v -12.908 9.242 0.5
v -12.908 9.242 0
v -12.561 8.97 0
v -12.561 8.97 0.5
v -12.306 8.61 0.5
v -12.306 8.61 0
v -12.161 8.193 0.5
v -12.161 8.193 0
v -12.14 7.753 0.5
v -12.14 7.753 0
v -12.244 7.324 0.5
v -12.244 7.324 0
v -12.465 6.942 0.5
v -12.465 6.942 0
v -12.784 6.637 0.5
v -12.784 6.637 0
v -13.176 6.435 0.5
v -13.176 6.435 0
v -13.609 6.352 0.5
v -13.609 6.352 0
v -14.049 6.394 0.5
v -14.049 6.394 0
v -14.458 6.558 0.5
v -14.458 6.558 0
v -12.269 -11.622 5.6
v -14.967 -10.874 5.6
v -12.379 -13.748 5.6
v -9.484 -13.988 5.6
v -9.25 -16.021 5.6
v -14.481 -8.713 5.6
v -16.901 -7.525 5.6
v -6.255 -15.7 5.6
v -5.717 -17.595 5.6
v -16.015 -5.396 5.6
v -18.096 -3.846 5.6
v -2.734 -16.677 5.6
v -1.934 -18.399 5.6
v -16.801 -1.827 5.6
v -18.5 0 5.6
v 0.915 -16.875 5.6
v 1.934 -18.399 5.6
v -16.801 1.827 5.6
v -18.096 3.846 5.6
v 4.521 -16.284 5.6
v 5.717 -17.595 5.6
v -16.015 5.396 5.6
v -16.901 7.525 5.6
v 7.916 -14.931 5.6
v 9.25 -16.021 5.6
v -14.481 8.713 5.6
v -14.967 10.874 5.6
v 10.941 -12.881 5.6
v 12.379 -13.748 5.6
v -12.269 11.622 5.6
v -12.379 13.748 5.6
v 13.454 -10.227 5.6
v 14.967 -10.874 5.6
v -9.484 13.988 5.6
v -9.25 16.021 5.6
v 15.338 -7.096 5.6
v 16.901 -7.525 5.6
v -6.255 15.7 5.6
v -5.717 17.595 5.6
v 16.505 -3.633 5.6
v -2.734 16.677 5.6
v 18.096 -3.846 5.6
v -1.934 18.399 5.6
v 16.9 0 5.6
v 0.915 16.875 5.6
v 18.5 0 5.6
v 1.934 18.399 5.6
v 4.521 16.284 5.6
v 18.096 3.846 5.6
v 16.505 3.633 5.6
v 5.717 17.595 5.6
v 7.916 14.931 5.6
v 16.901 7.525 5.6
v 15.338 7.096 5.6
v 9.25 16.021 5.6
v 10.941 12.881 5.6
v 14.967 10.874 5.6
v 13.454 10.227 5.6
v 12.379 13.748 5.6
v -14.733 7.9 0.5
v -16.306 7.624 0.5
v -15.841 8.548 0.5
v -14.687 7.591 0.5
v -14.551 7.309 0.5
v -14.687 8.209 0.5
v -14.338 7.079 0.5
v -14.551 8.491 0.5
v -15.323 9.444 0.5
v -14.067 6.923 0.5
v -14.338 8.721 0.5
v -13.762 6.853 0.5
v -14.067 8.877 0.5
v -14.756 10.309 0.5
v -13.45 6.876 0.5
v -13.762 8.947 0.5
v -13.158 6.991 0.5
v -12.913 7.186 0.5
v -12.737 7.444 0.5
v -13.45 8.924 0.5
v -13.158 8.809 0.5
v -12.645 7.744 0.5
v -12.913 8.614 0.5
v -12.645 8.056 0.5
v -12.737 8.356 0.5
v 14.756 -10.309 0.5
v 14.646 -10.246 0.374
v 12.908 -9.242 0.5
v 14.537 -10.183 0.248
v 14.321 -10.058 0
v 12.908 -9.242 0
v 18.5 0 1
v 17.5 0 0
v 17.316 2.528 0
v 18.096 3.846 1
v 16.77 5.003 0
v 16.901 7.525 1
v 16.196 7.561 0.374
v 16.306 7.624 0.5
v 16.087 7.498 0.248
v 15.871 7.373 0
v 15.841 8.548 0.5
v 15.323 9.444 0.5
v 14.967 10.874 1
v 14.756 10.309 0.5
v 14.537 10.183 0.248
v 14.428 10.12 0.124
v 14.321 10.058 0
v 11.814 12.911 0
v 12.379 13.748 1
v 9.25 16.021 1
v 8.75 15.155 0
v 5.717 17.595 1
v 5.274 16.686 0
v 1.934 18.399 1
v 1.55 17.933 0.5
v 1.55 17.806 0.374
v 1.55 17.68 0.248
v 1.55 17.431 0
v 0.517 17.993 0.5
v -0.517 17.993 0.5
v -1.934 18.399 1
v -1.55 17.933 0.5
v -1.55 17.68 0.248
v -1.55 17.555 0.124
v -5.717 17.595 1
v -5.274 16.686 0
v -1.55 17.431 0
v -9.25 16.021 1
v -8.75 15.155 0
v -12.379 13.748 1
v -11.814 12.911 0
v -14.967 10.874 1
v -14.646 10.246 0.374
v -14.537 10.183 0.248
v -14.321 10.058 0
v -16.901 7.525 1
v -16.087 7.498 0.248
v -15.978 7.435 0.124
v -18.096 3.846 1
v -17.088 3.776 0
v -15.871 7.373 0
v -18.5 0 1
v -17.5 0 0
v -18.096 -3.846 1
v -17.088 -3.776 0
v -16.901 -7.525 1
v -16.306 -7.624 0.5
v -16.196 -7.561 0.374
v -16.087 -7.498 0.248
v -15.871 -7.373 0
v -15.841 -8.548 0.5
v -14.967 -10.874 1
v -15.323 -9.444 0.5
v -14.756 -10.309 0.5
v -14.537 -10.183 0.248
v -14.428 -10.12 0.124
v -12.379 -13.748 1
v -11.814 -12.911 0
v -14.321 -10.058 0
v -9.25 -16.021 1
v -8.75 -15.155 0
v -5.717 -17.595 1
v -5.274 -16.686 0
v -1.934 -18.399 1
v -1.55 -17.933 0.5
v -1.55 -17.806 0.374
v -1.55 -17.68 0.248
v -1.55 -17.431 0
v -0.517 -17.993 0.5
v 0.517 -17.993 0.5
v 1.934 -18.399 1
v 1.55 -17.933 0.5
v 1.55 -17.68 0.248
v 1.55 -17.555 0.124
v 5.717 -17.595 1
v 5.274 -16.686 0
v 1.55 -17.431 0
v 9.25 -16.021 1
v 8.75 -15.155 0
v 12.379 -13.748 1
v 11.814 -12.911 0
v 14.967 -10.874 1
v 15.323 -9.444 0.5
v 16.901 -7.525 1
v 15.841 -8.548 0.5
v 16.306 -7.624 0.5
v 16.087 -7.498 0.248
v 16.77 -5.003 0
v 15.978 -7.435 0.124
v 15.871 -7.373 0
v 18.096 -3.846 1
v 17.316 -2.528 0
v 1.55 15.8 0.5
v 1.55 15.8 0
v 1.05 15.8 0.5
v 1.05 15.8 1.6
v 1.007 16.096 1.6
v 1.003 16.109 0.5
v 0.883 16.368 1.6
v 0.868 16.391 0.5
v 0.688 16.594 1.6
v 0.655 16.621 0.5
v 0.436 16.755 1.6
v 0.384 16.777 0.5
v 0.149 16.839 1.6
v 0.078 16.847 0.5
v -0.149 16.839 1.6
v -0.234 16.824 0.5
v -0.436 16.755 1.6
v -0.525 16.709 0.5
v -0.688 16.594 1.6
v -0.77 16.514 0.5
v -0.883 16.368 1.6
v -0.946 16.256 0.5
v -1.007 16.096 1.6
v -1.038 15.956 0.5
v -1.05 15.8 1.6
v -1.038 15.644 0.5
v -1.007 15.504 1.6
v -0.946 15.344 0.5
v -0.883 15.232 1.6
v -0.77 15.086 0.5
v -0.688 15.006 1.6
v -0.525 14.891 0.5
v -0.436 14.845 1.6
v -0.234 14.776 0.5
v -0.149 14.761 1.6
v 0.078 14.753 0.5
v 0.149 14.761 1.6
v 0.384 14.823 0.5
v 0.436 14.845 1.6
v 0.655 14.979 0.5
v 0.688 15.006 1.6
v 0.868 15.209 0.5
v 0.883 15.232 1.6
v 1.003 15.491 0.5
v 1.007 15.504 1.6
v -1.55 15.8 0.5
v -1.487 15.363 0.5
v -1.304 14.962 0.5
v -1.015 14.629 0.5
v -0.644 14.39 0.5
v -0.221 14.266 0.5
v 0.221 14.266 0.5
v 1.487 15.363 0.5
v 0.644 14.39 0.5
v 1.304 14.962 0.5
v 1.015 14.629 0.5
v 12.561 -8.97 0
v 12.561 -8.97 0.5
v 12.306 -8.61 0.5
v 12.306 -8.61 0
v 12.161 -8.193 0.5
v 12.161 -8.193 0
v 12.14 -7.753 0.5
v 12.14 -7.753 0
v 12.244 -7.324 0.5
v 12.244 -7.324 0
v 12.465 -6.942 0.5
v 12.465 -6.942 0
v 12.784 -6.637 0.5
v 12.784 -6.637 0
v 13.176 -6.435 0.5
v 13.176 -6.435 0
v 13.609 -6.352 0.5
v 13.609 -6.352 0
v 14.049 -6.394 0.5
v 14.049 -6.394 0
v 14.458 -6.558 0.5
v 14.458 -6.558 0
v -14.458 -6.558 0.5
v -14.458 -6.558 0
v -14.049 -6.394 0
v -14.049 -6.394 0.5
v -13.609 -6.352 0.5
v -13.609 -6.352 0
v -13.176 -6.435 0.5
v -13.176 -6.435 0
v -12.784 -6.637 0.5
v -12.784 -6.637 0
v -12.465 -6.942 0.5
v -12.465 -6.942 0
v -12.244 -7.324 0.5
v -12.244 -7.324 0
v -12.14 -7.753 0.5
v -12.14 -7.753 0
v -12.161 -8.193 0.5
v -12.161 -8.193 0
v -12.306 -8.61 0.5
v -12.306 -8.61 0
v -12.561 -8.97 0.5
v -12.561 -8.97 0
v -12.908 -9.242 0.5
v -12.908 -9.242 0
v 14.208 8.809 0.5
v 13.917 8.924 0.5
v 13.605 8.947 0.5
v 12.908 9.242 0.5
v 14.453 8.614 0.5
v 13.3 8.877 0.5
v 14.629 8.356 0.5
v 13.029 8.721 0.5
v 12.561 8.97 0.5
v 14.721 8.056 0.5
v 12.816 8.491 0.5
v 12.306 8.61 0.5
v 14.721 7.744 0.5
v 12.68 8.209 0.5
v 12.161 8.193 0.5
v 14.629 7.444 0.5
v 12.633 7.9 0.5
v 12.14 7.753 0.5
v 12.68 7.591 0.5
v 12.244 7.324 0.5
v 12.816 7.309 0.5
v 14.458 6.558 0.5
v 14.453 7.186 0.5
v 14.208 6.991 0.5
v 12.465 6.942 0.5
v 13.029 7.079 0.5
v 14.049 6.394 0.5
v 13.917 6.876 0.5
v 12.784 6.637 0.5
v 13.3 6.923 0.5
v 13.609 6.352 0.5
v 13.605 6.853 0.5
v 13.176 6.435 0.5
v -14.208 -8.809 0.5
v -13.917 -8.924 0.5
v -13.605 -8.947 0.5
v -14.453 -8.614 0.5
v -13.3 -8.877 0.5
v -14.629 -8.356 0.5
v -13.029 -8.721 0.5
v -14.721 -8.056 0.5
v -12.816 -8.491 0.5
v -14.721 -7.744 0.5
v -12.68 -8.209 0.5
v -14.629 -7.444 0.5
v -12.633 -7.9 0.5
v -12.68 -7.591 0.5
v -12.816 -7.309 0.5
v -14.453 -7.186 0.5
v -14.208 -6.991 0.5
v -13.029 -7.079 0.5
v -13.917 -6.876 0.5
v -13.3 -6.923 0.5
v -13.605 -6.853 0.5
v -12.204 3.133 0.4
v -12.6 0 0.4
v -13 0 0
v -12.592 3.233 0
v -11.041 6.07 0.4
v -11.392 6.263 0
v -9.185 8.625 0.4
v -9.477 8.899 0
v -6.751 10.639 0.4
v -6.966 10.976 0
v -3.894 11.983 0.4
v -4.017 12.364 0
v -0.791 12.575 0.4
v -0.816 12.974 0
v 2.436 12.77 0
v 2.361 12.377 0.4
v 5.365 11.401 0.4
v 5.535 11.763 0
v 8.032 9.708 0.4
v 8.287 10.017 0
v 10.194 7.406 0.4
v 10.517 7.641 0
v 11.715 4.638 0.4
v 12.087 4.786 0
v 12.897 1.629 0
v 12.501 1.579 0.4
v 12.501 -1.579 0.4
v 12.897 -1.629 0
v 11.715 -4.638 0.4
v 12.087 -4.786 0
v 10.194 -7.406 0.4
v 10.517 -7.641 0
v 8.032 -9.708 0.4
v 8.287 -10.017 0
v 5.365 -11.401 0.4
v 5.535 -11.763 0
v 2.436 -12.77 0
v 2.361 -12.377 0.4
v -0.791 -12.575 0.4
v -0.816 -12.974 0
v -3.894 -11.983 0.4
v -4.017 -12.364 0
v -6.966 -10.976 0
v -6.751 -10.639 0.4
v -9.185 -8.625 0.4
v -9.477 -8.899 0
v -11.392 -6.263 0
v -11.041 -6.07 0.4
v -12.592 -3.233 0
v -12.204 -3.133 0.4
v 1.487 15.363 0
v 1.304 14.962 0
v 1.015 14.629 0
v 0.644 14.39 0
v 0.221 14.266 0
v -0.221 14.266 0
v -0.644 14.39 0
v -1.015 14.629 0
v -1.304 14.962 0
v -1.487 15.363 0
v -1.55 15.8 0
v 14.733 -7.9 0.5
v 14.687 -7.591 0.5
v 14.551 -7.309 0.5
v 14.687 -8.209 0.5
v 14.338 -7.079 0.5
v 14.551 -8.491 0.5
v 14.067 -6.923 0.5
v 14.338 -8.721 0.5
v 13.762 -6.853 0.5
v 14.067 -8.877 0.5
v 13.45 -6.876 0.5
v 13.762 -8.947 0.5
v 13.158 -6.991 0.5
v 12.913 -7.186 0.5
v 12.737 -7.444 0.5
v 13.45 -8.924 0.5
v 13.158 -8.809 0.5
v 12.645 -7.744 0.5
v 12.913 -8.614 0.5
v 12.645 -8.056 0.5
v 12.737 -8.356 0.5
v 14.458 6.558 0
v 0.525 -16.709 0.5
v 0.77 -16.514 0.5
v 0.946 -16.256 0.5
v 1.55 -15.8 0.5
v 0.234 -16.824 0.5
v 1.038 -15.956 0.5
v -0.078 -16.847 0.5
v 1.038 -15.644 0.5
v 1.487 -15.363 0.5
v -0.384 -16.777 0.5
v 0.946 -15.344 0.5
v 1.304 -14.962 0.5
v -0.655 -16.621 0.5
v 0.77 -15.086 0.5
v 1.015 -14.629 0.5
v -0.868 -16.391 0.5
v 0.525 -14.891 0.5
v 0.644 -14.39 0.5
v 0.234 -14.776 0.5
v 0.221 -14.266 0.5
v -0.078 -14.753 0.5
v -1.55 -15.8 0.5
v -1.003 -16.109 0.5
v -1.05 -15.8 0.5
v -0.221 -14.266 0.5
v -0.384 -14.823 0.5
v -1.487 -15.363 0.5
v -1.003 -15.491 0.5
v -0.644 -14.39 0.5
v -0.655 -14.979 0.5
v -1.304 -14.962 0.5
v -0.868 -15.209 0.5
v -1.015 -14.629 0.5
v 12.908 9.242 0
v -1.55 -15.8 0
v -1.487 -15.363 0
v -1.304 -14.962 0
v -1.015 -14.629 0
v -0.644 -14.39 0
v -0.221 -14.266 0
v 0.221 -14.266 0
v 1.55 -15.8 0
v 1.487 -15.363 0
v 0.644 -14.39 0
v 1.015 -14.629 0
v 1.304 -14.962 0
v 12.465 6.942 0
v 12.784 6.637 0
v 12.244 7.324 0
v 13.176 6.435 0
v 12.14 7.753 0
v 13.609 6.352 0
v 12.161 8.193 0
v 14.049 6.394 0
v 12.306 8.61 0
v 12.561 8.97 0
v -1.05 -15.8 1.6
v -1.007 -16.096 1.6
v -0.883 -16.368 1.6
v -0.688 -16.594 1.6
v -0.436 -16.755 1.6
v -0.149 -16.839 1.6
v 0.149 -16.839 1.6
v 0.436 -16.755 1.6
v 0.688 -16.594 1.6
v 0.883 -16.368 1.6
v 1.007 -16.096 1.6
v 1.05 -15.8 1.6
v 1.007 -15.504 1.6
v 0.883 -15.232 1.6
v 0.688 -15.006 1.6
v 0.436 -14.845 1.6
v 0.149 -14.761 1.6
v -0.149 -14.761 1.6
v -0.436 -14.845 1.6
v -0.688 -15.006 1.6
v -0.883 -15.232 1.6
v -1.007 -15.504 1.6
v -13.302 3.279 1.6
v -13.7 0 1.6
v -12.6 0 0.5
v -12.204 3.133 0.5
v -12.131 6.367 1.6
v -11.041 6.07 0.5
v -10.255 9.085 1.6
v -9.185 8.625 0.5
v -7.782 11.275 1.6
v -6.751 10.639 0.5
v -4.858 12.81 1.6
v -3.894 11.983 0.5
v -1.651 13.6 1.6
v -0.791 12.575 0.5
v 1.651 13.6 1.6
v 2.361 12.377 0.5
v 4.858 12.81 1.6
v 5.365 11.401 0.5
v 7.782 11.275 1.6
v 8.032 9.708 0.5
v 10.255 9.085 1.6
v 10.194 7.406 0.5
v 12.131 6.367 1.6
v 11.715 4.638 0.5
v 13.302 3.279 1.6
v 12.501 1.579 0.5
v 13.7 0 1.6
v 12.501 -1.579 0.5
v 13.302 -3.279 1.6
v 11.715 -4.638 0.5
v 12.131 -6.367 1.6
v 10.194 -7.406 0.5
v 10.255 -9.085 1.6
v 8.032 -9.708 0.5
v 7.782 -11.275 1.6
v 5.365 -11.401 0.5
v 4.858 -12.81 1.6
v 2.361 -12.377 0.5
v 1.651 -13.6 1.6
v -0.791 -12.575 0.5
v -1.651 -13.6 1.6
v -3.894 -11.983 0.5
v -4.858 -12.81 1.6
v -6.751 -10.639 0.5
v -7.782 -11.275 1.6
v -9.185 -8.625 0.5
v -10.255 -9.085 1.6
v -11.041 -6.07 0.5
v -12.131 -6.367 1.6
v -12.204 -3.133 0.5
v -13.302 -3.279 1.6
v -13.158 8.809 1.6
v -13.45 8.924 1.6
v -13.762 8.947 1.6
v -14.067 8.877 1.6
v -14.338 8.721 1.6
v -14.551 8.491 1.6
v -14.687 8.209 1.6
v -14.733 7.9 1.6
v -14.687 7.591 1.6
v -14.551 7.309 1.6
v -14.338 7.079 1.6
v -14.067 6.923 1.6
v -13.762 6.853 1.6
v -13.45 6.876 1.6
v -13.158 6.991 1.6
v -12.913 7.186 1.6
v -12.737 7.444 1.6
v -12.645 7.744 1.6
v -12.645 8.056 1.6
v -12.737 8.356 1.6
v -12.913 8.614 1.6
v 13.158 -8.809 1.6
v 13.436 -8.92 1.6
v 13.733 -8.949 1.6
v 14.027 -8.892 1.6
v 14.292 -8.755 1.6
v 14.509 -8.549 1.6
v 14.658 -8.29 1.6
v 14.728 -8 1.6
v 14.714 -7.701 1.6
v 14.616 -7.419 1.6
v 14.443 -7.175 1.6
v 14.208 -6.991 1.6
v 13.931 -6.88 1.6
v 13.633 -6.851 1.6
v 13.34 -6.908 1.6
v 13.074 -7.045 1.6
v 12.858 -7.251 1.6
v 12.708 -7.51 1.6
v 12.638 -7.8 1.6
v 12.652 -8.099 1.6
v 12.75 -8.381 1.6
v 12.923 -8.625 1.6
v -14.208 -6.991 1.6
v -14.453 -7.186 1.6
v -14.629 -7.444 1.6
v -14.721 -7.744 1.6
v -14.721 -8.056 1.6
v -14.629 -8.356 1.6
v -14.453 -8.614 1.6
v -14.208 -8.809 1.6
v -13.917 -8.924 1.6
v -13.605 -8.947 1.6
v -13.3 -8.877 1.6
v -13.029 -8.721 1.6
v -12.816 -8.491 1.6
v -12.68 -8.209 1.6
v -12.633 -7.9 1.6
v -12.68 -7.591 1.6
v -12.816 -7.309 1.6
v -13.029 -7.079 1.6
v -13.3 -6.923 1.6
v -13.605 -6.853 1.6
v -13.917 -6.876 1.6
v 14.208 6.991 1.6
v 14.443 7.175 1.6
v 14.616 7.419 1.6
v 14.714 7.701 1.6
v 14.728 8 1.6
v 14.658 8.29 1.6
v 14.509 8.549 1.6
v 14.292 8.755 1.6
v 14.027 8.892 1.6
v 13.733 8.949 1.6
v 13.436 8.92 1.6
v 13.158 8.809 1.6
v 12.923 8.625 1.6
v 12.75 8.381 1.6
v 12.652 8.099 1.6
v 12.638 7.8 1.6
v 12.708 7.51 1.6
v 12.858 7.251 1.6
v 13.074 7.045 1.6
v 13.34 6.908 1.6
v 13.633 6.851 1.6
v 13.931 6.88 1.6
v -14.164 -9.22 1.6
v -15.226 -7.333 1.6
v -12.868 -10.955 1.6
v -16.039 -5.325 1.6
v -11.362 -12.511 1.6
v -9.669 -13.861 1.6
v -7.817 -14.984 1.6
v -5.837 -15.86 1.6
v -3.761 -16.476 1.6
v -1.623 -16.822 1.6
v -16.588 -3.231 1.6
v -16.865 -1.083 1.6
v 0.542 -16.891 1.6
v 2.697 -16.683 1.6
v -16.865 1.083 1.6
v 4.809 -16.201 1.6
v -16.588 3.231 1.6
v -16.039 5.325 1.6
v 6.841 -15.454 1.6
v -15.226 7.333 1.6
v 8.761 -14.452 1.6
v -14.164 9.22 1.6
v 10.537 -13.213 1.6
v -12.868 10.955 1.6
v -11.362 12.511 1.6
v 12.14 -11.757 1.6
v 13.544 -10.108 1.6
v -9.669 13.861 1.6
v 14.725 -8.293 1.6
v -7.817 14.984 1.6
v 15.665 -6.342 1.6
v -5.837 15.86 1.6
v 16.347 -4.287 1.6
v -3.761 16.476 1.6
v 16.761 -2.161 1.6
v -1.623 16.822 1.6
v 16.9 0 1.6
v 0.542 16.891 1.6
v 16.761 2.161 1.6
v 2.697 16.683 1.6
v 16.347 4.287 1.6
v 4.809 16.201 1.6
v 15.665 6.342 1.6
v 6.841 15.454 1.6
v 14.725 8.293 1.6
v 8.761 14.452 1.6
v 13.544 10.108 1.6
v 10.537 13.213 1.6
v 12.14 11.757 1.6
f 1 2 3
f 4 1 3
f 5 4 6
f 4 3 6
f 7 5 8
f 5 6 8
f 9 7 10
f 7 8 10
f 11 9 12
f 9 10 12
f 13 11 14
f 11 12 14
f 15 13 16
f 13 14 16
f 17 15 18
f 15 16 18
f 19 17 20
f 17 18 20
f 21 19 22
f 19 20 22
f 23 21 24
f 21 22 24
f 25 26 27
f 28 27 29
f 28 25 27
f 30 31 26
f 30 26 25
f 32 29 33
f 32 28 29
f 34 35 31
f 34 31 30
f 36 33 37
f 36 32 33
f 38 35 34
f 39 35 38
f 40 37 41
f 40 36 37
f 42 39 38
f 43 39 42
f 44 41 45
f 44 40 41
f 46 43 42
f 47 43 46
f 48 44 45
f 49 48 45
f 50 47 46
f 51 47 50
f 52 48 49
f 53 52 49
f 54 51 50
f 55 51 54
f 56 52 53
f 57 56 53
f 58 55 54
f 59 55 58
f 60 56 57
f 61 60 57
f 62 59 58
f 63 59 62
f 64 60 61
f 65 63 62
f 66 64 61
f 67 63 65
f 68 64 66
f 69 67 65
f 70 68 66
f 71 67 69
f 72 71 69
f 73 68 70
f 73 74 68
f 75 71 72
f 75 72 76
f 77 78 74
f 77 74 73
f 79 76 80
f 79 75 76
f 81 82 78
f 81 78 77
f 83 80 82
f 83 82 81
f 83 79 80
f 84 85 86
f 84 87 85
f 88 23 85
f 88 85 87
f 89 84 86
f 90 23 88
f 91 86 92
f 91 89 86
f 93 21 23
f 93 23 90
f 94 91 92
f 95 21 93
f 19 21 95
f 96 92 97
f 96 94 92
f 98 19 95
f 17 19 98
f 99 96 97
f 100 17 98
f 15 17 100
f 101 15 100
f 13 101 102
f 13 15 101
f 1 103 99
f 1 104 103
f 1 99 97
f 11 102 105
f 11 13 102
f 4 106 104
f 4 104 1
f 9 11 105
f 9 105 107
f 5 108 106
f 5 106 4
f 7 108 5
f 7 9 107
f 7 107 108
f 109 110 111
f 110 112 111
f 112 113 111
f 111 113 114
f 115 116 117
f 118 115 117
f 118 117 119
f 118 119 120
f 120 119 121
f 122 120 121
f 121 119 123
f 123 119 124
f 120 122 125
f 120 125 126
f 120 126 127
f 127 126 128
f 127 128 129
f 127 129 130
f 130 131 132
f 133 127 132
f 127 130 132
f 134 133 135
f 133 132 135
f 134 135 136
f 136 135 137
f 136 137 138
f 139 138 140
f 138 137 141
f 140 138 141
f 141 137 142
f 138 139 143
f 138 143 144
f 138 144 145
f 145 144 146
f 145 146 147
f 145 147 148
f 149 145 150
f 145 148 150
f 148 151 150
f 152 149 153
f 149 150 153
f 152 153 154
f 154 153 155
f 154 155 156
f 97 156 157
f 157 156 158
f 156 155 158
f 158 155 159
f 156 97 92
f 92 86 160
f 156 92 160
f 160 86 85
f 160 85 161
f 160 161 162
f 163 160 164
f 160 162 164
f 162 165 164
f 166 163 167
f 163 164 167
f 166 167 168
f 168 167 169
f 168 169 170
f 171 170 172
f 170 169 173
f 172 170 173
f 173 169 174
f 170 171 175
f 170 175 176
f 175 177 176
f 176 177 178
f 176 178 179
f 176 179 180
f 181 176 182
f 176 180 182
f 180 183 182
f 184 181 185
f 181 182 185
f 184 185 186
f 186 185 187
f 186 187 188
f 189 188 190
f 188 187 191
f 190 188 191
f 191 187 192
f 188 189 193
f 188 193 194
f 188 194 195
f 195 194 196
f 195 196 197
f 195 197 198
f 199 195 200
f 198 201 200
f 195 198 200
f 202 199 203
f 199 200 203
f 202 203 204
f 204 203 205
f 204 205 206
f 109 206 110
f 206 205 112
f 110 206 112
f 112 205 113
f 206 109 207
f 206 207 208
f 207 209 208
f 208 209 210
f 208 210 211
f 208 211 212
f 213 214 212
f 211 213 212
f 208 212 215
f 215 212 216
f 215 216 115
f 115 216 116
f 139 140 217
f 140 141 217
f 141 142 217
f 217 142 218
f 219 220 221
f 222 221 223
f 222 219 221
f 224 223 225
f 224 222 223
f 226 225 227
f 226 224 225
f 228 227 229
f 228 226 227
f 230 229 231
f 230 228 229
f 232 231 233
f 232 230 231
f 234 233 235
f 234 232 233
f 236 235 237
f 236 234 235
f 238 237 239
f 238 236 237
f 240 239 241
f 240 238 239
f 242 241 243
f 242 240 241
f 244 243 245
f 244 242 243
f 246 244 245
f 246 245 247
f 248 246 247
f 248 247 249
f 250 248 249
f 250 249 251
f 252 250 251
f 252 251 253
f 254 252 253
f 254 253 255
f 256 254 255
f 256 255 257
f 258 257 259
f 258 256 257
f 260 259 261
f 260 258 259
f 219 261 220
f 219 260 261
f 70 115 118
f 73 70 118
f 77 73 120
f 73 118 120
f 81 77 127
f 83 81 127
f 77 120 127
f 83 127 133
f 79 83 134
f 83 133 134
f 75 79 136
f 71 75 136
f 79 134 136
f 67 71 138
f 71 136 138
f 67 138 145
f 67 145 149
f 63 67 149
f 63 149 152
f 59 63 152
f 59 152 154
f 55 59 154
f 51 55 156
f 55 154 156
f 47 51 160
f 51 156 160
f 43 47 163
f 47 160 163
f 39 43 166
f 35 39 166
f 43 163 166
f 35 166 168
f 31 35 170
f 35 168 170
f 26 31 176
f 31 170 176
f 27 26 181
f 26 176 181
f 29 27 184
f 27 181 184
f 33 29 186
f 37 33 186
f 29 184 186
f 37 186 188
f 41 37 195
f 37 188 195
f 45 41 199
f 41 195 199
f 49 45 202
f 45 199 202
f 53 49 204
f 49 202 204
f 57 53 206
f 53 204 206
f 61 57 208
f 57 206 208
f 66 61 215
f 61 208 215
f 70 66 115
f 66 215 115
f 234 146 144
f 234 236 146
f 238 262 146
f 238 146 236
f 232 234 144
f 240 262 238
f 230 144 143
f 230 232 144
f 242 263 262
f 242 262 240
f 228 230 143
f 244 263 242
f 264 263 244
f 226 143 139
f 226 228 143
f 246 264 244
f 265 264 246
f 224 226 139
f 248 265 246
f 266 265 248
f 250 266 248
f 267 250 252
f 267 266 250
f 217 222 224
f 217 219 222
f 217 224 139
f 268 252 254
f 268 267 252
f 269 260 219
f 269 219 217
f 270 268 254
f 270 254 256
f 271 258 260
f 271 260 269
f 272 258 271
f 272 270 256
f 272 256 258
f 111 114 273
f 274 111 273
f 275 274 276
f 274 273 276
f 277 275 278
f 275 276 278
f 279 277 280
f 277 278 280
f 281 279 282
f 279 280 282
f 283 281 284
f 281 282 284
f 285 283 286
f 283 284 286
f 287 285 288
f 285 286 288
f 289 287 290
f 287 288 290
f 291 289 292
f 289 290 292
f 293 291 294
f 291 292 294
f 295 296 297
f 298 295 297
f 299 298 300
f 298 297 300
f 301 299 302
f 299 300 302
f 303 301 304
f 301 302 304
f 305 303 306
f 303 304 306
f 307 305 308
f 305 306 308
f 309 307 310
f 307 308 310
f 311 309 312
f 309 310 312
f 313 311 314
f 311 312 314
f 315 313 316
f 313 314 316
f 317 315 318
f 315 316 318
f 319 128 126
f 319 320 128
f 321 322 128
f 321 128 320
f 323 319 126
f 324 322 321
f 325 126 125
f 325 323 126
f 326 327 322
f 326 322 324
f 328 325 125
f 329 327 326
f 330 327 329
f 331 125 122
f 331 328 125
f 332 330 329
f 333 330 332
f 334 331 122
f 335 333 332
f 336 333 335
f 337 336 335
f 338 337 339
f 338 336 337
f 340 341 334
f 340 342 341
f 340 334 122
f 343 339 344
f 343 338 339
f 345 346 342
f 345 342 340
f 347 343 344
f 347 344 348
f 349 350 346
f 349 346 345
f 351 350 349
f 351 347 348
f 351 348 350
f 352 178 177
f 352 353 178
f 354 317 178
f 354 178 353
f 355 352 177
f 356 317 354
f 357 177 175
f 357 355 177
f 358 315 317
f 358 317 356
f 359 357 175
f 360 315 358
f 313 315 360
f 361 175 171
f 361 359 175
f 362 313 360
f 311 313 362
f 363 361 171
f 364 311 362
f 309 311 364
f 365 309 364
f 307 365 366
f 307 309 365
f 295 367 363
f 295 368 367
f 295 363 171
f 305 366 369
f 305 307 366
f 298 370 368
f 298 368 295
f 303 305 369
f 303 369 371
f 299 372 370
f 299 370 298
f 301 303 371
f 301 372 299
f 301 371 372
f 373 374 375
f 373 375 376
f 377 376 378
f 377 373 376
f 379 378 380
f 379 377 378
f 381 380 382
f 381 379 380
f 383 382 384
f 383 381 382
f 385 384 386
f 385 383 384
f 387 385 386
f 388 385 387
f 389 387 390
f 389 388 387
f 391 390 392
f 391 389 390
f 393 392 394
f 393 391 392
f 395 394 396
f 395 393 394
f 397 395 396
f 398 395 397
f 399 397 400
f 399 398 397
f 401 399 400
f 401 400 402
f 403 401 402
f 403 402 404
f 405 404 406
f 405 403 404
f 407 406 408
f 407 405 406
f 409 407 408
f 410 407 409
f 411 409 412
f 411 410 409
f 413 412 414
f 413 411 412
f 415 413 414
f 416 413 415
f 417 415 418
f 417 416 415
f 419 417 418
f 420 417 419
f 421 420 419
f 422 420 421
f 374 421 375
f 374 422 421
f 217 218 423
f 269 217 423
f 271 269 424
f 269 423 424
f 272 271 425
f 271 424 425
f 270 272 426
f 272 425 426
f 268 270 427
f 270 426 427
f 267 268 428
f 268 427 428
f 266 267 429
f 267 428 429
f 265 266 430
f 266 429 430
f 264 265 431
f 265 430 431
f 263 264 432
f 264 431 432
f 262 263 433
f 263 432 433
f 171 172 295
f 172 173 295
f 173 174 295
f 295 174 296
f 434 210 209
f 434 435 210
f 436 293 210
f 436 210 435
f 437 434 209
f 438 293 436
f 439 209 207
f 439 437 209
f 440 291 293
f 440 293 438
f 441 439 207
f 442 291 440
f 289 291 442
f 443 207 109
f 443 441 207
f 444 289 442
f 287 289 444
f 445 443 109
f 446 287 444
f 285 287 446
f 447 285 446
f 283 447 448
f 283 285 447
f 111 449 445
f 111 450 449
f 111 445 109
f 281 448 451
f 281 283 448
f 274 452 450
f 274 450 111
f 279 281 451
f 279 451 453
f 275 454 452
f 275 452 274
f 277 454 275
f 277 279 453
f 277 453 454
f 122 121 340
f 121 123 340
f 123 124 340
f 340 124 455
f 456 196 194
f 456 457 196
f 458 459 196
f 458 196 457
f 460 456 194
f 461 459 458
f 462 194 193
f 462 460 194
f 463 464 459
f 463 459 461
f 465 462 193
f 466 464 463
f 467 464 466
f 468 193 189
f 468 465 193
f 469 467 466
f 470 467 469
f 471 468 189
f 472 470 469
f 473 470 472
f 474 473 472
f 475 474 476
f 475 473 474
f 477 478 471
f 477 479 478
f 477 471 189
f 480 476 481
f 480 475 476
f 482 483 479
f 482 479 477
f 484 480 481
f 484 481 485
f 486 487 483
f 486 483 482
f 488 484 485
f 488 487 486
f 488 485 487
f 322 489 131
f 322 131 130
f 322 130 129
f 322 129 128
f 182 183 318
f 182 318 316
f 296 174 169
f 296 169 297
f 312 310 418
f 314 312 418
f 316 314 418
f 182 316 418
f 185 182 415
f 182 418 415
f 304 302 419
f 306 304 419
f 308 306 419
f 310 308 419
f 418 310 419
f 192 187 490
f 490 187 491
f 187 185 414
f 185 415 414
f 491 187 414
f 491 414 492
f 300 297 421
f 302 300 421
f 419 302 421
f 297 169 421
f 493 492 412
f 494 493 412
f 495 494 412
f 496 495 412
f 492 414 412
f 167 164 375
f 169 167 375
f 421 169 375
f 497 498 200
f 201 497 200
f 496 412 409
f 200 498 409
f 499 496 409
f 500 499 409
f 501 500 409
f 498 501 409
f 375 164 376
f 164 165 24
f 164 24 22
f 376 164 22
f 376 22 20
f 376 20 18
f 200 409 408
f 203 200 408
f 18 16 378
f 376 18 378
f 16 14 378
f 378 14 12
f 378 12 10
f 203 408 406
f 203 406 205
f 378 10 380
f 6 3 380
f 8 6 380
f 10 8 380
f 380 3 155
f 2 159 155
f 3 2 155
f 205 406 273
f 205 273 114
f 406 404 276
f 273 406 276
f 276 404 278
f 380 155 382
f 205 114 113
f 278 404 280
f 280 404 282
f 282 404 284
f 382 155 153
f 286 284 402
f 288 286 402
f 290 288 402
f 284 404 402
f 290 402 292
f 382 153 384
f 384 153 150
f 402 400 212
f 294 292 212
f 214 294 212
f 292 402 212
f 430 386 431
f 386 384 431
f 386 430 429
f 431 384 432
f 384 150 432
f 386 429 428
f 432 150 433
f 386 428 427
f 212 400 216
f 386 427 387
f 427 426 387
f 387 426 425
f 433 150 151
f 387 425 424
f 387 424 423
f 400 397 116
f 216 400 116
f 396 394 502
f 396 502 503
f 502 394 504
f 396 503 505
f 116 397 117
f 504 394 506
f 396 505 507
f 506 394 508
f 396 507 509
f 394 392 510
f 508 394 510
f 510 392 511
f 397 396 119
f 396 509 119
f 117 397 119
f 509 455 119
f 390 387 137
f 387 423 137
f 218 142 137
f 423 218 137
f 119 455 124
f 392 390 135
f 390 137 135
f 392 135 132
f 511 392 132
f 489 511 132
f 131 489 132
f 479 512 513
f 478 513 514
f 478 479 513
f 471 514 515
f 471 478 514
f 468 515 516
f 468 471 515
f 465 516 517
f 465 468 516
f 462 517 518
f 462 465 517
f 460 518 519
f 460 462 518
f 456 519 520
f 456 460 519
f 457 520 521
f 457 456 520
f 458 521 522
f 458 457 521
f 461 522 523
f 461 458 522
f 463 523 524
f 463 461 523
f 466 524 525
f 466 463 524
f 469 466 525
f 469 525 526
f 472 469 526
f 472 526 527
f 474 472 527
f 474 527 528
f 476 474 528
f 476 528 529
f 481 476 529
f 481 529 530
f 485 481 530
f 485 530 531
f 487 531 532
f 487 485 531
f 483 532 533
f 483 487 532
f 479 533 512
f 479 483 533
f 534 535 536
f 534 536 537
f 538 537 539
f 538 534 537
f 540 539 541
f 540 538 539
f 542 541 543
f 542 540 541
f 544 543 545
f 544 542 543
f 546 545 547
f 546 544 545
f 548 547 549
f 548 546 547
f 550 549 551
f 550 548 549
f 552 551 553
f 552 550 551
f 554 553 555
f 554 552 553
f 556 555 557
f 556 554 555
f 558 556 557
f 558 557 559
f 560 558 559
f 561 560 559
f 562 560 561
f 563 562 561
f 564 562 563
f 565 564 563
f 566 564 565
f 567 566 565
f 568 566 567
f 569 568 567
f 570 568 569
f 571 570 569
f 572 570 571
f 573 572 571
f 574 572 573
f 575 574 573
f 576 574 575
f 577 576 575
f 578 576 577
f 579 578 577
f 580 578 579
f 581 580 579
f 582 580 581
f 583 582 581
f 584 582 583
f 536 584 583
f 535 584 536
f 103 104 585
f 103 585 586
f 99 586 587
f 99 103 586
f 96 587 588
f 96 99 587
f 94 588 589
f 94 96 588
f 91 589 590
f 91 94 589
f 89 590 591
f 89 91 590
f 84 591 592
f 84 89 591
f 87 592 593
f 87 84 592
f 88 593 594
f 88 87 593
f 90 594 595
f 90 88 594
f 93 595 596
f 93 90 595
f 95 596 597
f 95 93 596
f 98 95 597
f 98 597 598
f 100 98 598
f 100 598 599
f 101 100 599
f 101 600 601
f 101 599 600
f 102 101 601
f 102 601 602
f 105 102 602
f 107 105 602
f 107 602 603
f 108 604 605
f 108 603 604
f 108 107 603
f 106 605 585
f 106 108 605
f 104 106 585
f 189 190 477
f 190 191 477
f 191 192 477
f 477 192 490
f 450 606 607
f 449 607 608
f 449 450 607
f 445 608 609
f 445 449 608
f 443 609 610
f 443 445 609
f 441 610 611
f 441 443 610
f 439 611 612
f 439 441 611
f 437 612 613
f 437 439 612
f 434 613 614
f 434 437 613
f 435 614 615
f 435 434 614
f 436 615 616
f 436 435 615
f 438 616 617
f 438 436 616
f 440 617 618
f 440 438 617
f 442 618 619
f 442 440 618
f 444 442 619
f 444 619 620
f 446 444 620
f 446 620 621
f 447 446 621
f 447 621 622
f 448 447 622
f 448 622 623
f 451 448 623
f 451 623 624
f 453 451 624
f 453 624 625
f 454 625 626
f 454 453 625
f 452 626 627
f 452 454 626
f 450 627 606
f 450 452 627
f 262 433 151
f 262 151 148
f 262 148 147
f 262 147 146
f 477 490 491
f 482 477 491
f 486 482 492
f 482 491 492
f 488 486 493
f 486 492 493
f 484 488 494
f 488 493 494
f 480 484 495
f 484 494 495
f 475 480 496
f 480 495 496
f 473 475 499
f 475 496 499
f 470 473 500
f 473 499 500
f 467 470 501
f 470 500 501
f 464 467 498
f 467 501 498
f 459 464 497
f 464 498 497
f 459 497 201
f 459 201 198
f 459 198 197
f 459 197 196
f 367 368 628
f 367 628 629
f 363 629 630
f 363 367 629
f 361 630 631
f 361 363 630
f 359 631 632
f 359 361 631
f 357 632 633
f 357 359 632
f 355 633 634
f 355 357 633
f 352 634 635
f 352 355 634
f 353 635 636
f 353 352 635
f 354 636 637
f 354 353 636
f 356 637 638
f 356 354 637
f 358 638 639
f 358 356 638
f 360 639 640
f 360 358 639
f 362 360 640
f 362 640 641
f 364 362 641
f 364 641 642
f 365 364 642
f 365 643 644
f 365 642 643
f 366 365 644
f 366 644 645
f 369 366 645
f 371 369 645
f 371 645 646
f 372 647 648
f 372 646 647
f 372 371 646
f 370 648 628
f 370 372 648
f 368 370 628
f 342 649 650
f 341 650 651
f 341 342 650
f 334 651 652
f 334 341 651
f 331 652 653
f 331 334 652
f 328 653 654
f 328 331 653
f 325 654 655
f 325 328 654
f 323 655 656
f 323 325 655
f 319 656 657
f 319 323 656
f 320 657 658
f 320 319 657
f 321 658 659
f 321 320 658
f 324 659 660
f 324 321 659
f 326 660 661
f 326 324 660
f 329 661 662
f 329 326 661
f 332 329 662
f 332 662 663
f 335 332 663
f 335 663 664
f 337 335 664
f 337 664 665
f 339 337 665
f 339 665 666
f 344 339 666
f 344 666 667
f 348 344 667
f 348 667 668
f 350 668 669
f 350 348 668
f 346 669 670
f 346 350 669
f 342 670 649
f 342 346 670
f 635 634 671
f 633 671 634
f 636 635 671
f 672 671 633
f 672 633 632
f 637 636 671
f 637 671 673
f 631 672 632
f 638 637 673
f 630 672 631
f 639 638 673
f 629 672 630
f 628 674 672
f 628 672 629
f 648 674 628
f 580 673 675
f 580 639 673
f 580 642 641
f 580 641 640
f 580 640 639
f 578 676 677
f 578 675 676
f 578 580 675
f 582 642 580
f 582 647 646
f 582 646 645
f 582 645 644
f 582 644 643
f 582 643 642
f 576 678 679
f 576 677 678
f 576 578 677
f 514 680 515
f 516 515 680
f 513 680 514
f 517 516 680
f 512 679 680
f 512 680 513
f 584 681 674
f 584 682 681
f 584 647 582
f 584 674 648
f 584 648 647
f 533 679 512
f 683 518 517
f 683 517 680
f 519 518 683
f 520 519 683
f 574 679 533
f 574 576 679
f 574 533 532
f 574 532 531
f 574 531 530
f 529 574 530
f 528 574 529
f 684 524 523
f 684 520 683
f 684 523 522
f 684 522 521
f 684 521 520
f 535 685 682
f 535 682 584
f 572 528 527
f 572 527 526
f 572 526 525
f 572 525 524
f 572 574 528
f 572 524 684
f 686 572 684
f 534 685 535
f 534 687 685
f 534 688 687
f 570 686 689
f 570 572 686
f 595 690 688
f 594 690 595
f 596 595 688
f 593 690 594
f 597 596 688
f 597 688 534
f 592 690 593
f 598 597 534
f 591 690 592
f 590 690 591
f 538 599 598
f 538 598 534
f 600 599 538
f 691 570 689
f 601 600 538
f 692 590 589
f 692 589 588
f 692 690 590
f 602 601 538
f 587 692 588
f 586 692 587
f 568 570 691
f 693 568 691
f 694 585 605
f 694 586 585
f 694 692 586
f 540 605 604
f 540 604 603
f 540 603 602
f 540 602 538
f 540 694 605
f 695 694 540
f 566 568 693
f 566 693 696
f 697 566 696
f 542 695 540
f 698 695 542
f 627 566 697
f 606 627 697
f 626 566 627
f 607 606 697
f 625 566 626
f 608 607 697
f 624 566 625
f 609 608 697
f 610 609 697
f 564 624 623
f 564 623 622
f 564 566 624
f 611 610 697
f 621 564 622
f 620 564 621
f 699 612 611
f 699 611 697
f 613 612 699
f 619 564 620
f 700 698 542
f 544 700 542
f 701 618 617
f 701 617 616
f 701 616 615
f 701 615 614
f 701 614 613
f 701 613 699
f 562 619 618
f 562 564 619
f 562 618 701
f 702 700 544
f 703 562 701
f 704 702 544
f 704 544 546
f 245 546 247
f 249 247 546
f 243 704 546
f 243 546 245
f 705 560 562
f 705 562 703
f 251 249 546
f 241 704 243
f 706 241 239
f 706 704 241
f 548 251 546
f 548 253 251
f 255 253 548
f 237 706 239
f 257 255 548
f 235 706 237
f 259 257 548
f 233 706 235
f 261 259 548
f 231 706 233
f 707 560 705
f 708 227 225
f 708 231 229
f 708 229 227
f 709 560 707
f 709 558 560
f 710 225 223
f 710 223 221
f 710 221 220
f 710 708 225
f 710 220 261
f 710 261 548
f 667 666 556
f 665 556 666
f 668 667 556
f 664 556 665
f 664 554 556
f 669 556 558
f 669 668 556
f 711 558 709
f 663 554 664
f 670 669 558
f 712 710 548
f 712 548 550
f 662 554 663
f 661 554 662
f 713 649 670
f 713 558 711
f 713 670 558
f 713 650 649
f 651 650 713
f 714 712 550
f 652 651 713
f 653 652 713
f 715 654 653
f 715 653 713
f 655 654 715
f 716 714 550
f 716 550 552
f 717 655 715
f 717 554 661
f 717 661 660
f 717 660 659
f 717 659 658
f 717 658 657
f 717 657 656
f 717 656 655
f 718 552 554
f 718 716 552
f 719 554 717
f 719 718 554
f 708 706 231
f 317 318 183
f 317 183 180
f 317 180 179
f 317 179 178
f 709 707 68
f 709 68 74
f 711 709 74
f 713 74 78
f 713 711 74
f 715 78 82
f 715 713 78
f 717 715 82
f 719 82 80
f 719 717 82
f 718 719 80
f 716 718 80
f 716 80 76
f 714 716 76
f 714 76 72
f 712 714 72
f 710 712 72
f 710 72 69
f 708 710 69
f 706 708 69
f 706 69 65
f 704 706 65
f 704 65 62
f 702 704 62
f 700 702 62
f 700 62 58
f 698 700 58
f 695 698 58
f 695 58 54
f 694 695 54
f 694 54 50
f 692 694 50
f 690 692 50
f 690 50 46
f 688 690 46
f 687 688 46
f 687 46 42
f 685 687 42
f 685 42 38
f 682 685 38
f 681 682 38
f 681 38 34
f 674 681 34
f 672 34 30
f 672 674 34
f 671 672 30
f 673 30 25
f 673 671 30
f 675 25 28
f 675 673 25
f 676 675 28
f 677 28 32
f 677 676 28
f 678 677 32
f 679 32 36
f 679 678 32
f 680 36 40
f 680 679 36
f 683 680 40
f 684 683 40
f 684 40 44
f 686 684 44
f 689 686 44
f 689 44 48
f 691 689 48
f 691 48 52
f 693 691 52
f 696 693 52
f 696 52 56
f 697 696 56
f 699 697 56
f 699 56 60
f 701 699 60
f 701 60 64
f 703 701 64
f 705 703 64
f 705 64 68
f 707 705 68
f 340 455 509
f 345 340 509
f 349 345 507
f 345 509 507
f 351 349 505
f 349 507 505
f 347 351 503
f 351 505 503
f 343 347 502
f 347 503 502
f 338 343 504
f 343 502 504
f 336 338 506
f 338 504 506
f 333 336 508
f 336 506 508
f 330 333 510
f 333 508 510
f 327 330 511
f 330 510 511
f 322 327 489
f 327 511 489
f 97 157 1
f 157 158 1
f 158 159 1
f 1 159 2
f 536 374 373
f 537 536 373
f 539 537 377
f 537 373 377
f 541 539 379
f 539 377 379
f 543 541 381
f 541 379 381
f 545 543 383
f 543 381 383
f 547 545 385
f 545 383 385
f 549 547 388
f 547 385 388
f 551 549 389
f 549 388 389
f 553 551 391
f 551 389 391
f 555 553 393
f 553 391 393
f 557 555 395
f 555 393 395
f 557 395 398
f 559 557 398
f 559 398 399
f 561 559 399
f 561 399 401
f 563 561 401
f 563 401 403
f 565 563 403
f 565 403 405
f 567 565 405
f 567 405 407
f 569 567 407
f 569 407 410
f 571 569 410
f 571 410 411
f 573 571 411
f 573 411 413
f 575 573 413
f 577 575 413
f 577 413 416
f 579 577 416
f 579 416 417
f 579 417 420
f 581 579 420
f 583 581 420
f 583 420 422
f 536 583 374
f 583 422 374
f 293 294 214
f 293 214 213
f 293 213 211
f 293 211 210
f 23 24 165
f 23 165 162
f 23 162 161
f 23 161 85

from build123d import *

# Parameters (mm, degrees)
SKETCH1_R           = 18.5
BOSS_EXTRUDE1_DEPTH = 5.6
SHELL1_T            = -1.6
SKETCH2_R           = 12.6
CUT_EXTRUDE1_DEPTH  = 27.75556017
SKETCH3_R           = 1.05
CUT_EXTRUDE3_DEPTH  = 27.75556017
CIRPATTERN1_COUNT   = 6
CHAMFER1_SIZE       = 1
CUT_EXTRUDE4_DEPTH  = 0.5
CIRPATTERN2_COUNT   = 6
CHAMFER2_SIZE       = 0.4
CHAMFER3_SIZE       = 1.1


with BuildPart() as part:
    # Sketch1 → Boss-Extrude1 (new body)
    with BuildSketch(Plane.XY):
        Circle(SKETCH1_R)
    extrude(amount=BOSS_EXTRUDE1_DEPTH)

    # Shell1
    shell1_openings = [part.faces().sort_by_distance(p)[0] for p in [
        (0, 0, 5.6),
    ]]
    offset(amount=SHELL1_T, openings=shell1_openings, kind=Kind.INTERSECTION)

    # Sketch2 → Cut-Extrude1 (cut, through all)
    with BuildSketch(Plane(origin=(0, 0, 0), x_dir=(-1, 0, 0), z_dir=(0, 0, -1))):
        Circle(SKETCH2_R)
    extrude(amount=-CUT_EXTRUDE1_DEPTH, mode=Mode.SUBTRACT)

    # Sketch3 → Cut-Extrude3 (cut, through all)
    with BuildSketch(Plane.XY):
        with Locations((0, 15.8)):
            Circle(SKETCH3_R)
    cut_extrude3 = extrude(amount=CUT_EXTRUDE3_DEPTH, mode=Mode.SUBTRACT)

    # CirPattern1: Cut-Extrude3 ×6 about axis
    cirpattern1_axis = Axis((0, 0, 0), (0, 0, 1))
    for i in range(1, CIRPATTERN1_COUNT):
        add(cut_extrude3.rotate(cirpattern1_axis, i * 360 / CIRPATTERN1_COUNT), mode=Mode.SUBTRACT)

    # Chamfer1
    chamfer1_edges = [part.edges().sort_by_distance(p)[0] for p in [
        (-18.5, 0, 0),
    ]]
    chamfer(chamfer1_edges, length=CHAMFER1_SIZE)

    # Sketch4 → Cut-Extrude4 (cut)
    with BuildSketch(Plane(origin=(0, 0, 0), x_dir=(-1, 0, 0), z_dir=(0, 0, -1))):
        with BuildLine():
            Line((-1.55, -15.8), (-1.55, -18.667530629))
            Line((-1.55, -18.667530629), (1.55, -18.667530629))
            Line((1.55, -18.667530629), (1.55, -15.8))
            ThreePointArc((1.55, -15.8), (0, -14.25), (-1.55, -15.8))
        make_face()
    cut_extrude4 = extrude(amount=-CUT_EXTRUDE4_DEPTH, mode=Mode.SUBTRACT)

    # CirPattern2: Cut-Extrude4 ×6 about axis
    cirpattern2_axis = Axis((0, 0, 0), (0, 0, 1))
    for i in range(1, CIRPATTERN2_COUNT):
        add(cut_extrude4.rotate(cirpattern2_axis, i * 360 / CIRPATTERN2_COUNT), mode=Mode.SUBTRACT)

    # Chamfer2
    chamfer2_edges = [part.edges().sort_by_distance(p)[0] for p in [
        (12.6, 0, 0),
    ]]
    chamfer(chamfer2_edges, length=CHAMFER2_SIZE)

    # Chamfer3
    chamfer3_edges = [part.edges().sort_by_distance(p)[0] for p in [
        (12.6, 0, 1.6),
    ]]
    chamfer(chamfer3_edges, length=CHAMFER3_SIZE)


solid = part.part
